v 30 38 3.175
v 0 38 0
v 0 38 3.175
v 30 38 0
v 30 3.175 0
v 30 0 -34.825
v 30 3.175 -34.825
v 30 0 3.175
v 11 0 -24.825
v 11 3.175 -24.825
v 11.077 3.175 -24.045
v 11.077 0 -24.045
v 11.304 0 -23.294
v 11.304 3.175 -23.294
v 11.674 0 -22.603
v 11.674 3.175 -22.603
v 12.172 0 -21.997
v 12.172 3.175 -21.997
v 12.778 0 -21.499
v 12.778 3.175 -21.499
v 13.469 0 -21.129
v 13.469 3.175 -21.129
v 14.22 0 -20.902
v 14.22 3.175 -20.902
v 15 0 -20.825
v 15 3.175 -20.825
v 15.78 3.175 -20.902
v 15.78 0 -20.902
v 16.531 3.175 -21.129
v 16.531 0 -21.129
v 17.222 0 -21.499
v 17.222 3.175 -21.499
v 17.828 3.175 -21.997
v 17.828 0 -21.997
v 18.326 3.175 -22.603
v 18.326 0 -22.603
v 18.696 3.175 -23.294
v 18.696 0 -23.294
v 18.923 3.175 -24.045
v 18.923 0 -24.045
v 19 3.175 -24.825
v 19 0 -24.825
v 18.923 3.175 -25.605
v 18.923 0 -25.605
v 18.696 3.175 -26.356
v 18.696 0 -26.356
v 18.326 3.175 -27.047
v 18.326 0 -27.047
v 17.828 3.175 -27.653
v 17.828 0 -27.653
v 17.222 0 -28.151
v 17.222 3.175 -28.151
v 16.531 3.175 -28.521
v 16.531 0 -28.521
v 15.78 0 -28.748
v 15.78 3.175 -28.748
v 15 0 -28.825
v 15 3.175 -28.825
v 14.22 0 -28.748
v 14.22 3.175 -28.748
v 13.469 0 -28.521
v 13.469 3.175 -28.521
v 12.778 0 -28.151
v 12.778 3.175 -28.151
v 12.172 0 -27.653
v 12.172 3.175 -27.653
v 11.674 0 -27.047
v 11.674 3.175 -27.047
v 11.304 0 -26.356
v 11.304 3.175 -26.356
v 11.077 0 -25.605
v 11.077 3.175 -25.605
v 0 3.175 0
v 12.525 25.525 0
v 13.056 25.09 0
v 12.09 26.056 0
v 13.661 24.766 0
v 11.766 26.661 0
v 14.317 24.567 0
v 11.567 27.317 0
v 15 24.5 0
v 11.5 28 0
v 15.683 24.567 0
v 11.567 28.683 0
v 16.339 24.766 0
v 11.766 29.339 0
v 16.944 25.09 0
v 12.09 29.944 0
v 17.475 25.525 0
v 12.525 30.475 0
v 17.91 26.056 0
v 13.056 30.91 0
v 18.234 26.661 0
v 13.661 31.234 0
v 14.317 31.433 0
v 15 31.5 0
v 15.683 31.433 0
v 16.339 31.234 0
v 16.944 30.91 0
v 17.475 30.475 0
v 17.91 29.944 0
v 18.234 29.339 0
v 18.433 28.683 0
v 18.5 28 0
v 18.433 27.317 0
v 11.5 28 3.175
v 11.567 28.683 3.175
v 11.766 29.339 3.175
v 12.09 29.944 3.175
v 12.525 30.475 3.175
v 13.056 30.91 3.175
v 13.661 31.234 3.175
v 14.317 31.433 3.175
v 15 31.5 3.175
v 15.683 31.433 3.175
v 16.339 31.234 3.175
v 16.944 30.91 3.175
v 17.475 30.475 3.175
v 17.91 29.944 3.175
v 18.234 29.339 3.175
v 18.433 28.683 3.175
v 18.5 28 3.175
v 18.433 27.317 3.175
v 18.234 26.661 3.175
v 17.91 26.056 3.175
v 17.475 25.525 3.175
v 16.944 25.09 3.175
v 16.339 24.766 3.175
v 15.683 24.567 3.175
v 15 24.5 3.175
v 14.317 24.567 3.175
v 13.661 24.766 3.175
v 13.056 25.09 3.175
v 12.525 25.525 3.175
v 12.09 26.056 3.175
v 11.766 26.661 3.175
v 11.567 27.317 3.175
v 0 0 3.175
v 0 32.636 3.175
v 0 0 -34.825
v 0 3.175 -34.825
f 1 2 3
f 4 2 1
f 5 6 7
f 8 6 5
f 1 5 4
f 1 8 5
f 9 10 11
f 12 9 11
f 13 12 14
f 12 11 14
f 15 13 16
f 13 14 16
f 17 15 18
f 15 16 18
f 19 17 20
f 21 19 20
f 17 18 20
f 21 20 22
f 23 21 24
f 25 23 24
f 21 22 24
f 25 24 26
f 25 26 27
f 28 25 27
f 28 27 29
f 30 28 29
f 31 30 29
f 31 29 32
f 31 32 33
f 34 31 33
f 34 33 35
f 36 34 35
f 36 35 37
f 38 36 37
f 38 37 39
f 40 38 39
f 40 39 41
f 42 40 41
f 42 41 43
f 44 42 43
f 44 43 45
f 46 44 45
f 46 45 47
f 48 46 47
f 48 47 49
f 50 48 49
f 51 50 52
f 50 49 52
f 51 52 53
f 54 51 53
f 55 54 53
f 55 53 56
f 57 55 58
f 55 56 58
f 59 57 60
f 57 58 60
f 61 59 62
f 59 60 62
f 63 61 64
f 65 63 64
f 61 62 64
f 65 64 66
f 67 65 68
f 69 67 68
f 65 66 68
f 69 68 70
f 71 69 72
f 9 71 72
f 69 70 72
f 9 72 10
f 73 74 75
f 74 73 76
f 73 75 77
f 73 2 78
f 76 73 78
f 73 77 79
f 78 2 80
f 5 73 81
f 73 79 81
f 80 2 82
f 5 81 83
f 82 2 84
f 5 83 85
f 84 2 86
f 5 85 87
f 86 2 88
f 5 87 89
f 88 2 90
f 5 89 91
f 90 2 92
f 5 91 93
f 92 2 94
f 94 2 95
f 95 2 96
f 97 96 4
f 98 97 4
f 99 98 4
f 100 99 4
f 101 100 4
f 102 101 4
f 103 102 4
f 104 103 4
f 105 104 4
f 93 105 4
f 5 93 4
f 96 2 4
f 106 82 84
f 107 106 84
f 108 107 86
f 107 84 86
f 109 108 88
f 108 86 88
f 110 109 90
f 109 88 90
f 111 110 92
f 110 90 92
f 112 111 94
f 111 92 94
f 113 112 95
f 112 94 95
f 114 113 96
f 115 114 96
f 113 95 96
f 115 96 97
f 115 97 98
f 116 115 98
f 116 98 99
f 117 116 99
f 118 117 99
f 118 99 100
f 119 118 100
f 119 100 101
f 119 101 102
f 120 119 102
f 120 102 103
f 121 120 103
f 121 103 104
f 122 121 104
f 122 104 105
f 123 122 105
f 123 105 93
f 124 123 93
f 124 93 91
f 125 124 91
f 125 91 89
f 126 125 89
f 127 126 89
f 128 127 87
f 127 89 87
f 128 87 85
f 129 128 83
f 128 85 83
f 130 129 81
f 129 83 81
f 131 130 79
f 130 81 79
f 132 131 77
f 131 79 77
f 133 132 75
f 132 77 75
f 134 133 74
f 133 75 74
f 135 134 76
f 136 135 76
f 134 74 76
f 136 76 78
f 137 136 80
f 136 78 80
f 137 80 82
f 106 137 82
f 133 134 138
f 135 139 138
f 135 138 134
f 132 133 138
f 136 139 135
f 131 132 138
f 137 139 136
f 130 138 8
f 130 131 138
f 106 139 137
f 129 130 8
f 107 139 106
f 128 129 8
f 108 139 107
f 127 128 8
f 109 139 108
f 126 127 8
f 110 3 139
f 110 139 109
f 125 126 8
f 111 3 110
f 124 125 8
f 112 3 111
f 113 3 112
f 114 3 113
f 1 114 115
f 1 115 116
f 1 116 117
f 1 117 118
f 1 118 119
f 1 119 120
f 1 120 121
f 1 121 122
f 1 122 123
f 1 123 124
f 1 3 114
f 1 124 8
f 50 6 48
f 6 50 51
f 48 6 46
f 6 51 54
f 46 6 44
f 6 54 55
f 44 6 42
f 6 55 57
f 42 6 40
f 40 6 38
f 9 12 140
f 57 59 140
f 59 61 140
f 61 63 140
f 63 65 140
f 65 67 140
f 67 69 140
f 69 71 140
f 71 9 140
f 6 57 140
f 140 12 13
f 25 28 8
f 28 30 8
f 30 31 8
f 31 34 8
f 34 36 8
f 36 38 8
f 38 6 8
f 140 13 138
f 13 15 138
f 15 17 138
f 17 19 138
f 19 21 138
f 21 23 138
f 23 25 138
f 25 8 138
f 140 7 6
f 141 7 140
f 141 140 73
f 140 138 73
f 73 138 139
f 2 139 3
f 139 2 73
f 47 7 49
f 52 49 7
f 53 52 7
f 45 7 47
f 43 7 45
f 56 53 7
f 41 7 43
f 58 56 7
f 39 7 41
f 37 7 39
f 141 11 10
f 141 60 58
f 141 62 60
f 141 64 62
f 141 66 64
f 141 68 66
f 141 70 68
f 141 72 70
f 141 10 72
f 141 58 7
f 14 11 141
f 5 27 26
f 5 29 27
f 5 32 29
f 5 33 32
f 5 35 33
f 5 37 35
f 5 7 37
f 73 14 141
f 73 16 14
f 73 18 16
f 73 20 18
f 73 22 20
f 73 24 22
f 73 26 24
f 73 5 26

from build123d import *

# Parameters (mm, degrees)
SKETCH1_W               = 30
SKETCH1_H               = 38
BOSS_EXTRUDE1_DEPTH     = 3.175
SKETCH2_W               = 30
SKETCH2_H               = 3.175
BOSS_EXTRUDE2_DEPTH     = 34.825
SKETCH3_R               = 4
CUT_EXTRUDE1_DEPTH      = 60.638751035
SKETCH4_R               = 4
CUT_EXTRUDE2_DEPTH      = 58.667679423
CROQUIS4_R              = 4
CROQUIS4_R_2            = 3.5
SALIENTE_EXTRUIR2_DEPTH = 5
CROQUIS5_W              = 3.979032683
CROQUIS5_H              = 10.100326852
CORTAR_EXTRUIR1_DEPTH   = 36


with BuildPart() as part:
    # Sketch1 → Boss-Extrude1 (new body)
    with BuildSketch(Plane.XY):
        with Locations((15, 19)):
            Rectangle(SKETCH1_W, SKETCH1_H)
    extrude(amount=BOSS_EXTRUDE1_DEPTH)

    # Sketch2 → Boss-Extrude2 (add)
    with BuildSketch(Plane(origin=(0, 0, 0), x_dir=(-1, 0, 0), z_dir=(0, 0, -1))):
        with Locations((-15, 1.5875)):
            Rectangle(SKETCH2_W, SKETCH2_H)
    extrude(amount=BOSS_EXTRUDE2_DEPTH)

    # Sketch3 → Cut-Extrude1 (cut, through all)
    with BuildSketch(Plane(origin=(0, 0, 0), x_dir=(-1, 0, 0), z_dir=(0, 0, -1))):
        with Locations((-15, 28)):
            Circle(SKETCH3_R)
    extrude(amount=-CUT_EXTRUDE1_DEPTH, mode=Mode.SUBTRACT)

    # Sketch4 → Cut-Extrude2 (cut, through all)
    with BuildSketch(Plane(origin=(0, 3.175, 0), x_dir=(1, 0, 0), z_dir=(0, 1, 0))):
        with Locations(Location((15, 24.825, 0), (0, 0, 180))):
            Circle(SKETCH4_R)
    extrude(amount=-CUT_EXTRUDE2_DEPTH, mode=Mode.SUBTRACT)

    # Croquis4 → Saliente-Extruir2 (add)
    with BuildSketch(Plane(origin=(0, 0, 0), x_dir=(-1, 0, 0), z_dir=(0, 0, -1))):
        with Locations((-15, 28)):
            Circle(CROQUIS4_R)
        with Locations((-15, 28)):
            Circle(CROQUIS4_R_2, mode=Mode.SUBTRACT)
    extrude(amount=-SALIENTE_EXTRUIR2_DEPTH)

    # Croquis5 → Cortar-Extruir1 (cut)
    with BuildSketch(Plane.ZY):
        with Locations((5.164516342, 27.585777405)):
            Rectangle(CROQUIS5_W, CROQUIS5_H)
    extrude(amount=-CORTAR_EXTRUIR1_DEPTH, mode=Mode.SUBTRACT)


solid = part.part
